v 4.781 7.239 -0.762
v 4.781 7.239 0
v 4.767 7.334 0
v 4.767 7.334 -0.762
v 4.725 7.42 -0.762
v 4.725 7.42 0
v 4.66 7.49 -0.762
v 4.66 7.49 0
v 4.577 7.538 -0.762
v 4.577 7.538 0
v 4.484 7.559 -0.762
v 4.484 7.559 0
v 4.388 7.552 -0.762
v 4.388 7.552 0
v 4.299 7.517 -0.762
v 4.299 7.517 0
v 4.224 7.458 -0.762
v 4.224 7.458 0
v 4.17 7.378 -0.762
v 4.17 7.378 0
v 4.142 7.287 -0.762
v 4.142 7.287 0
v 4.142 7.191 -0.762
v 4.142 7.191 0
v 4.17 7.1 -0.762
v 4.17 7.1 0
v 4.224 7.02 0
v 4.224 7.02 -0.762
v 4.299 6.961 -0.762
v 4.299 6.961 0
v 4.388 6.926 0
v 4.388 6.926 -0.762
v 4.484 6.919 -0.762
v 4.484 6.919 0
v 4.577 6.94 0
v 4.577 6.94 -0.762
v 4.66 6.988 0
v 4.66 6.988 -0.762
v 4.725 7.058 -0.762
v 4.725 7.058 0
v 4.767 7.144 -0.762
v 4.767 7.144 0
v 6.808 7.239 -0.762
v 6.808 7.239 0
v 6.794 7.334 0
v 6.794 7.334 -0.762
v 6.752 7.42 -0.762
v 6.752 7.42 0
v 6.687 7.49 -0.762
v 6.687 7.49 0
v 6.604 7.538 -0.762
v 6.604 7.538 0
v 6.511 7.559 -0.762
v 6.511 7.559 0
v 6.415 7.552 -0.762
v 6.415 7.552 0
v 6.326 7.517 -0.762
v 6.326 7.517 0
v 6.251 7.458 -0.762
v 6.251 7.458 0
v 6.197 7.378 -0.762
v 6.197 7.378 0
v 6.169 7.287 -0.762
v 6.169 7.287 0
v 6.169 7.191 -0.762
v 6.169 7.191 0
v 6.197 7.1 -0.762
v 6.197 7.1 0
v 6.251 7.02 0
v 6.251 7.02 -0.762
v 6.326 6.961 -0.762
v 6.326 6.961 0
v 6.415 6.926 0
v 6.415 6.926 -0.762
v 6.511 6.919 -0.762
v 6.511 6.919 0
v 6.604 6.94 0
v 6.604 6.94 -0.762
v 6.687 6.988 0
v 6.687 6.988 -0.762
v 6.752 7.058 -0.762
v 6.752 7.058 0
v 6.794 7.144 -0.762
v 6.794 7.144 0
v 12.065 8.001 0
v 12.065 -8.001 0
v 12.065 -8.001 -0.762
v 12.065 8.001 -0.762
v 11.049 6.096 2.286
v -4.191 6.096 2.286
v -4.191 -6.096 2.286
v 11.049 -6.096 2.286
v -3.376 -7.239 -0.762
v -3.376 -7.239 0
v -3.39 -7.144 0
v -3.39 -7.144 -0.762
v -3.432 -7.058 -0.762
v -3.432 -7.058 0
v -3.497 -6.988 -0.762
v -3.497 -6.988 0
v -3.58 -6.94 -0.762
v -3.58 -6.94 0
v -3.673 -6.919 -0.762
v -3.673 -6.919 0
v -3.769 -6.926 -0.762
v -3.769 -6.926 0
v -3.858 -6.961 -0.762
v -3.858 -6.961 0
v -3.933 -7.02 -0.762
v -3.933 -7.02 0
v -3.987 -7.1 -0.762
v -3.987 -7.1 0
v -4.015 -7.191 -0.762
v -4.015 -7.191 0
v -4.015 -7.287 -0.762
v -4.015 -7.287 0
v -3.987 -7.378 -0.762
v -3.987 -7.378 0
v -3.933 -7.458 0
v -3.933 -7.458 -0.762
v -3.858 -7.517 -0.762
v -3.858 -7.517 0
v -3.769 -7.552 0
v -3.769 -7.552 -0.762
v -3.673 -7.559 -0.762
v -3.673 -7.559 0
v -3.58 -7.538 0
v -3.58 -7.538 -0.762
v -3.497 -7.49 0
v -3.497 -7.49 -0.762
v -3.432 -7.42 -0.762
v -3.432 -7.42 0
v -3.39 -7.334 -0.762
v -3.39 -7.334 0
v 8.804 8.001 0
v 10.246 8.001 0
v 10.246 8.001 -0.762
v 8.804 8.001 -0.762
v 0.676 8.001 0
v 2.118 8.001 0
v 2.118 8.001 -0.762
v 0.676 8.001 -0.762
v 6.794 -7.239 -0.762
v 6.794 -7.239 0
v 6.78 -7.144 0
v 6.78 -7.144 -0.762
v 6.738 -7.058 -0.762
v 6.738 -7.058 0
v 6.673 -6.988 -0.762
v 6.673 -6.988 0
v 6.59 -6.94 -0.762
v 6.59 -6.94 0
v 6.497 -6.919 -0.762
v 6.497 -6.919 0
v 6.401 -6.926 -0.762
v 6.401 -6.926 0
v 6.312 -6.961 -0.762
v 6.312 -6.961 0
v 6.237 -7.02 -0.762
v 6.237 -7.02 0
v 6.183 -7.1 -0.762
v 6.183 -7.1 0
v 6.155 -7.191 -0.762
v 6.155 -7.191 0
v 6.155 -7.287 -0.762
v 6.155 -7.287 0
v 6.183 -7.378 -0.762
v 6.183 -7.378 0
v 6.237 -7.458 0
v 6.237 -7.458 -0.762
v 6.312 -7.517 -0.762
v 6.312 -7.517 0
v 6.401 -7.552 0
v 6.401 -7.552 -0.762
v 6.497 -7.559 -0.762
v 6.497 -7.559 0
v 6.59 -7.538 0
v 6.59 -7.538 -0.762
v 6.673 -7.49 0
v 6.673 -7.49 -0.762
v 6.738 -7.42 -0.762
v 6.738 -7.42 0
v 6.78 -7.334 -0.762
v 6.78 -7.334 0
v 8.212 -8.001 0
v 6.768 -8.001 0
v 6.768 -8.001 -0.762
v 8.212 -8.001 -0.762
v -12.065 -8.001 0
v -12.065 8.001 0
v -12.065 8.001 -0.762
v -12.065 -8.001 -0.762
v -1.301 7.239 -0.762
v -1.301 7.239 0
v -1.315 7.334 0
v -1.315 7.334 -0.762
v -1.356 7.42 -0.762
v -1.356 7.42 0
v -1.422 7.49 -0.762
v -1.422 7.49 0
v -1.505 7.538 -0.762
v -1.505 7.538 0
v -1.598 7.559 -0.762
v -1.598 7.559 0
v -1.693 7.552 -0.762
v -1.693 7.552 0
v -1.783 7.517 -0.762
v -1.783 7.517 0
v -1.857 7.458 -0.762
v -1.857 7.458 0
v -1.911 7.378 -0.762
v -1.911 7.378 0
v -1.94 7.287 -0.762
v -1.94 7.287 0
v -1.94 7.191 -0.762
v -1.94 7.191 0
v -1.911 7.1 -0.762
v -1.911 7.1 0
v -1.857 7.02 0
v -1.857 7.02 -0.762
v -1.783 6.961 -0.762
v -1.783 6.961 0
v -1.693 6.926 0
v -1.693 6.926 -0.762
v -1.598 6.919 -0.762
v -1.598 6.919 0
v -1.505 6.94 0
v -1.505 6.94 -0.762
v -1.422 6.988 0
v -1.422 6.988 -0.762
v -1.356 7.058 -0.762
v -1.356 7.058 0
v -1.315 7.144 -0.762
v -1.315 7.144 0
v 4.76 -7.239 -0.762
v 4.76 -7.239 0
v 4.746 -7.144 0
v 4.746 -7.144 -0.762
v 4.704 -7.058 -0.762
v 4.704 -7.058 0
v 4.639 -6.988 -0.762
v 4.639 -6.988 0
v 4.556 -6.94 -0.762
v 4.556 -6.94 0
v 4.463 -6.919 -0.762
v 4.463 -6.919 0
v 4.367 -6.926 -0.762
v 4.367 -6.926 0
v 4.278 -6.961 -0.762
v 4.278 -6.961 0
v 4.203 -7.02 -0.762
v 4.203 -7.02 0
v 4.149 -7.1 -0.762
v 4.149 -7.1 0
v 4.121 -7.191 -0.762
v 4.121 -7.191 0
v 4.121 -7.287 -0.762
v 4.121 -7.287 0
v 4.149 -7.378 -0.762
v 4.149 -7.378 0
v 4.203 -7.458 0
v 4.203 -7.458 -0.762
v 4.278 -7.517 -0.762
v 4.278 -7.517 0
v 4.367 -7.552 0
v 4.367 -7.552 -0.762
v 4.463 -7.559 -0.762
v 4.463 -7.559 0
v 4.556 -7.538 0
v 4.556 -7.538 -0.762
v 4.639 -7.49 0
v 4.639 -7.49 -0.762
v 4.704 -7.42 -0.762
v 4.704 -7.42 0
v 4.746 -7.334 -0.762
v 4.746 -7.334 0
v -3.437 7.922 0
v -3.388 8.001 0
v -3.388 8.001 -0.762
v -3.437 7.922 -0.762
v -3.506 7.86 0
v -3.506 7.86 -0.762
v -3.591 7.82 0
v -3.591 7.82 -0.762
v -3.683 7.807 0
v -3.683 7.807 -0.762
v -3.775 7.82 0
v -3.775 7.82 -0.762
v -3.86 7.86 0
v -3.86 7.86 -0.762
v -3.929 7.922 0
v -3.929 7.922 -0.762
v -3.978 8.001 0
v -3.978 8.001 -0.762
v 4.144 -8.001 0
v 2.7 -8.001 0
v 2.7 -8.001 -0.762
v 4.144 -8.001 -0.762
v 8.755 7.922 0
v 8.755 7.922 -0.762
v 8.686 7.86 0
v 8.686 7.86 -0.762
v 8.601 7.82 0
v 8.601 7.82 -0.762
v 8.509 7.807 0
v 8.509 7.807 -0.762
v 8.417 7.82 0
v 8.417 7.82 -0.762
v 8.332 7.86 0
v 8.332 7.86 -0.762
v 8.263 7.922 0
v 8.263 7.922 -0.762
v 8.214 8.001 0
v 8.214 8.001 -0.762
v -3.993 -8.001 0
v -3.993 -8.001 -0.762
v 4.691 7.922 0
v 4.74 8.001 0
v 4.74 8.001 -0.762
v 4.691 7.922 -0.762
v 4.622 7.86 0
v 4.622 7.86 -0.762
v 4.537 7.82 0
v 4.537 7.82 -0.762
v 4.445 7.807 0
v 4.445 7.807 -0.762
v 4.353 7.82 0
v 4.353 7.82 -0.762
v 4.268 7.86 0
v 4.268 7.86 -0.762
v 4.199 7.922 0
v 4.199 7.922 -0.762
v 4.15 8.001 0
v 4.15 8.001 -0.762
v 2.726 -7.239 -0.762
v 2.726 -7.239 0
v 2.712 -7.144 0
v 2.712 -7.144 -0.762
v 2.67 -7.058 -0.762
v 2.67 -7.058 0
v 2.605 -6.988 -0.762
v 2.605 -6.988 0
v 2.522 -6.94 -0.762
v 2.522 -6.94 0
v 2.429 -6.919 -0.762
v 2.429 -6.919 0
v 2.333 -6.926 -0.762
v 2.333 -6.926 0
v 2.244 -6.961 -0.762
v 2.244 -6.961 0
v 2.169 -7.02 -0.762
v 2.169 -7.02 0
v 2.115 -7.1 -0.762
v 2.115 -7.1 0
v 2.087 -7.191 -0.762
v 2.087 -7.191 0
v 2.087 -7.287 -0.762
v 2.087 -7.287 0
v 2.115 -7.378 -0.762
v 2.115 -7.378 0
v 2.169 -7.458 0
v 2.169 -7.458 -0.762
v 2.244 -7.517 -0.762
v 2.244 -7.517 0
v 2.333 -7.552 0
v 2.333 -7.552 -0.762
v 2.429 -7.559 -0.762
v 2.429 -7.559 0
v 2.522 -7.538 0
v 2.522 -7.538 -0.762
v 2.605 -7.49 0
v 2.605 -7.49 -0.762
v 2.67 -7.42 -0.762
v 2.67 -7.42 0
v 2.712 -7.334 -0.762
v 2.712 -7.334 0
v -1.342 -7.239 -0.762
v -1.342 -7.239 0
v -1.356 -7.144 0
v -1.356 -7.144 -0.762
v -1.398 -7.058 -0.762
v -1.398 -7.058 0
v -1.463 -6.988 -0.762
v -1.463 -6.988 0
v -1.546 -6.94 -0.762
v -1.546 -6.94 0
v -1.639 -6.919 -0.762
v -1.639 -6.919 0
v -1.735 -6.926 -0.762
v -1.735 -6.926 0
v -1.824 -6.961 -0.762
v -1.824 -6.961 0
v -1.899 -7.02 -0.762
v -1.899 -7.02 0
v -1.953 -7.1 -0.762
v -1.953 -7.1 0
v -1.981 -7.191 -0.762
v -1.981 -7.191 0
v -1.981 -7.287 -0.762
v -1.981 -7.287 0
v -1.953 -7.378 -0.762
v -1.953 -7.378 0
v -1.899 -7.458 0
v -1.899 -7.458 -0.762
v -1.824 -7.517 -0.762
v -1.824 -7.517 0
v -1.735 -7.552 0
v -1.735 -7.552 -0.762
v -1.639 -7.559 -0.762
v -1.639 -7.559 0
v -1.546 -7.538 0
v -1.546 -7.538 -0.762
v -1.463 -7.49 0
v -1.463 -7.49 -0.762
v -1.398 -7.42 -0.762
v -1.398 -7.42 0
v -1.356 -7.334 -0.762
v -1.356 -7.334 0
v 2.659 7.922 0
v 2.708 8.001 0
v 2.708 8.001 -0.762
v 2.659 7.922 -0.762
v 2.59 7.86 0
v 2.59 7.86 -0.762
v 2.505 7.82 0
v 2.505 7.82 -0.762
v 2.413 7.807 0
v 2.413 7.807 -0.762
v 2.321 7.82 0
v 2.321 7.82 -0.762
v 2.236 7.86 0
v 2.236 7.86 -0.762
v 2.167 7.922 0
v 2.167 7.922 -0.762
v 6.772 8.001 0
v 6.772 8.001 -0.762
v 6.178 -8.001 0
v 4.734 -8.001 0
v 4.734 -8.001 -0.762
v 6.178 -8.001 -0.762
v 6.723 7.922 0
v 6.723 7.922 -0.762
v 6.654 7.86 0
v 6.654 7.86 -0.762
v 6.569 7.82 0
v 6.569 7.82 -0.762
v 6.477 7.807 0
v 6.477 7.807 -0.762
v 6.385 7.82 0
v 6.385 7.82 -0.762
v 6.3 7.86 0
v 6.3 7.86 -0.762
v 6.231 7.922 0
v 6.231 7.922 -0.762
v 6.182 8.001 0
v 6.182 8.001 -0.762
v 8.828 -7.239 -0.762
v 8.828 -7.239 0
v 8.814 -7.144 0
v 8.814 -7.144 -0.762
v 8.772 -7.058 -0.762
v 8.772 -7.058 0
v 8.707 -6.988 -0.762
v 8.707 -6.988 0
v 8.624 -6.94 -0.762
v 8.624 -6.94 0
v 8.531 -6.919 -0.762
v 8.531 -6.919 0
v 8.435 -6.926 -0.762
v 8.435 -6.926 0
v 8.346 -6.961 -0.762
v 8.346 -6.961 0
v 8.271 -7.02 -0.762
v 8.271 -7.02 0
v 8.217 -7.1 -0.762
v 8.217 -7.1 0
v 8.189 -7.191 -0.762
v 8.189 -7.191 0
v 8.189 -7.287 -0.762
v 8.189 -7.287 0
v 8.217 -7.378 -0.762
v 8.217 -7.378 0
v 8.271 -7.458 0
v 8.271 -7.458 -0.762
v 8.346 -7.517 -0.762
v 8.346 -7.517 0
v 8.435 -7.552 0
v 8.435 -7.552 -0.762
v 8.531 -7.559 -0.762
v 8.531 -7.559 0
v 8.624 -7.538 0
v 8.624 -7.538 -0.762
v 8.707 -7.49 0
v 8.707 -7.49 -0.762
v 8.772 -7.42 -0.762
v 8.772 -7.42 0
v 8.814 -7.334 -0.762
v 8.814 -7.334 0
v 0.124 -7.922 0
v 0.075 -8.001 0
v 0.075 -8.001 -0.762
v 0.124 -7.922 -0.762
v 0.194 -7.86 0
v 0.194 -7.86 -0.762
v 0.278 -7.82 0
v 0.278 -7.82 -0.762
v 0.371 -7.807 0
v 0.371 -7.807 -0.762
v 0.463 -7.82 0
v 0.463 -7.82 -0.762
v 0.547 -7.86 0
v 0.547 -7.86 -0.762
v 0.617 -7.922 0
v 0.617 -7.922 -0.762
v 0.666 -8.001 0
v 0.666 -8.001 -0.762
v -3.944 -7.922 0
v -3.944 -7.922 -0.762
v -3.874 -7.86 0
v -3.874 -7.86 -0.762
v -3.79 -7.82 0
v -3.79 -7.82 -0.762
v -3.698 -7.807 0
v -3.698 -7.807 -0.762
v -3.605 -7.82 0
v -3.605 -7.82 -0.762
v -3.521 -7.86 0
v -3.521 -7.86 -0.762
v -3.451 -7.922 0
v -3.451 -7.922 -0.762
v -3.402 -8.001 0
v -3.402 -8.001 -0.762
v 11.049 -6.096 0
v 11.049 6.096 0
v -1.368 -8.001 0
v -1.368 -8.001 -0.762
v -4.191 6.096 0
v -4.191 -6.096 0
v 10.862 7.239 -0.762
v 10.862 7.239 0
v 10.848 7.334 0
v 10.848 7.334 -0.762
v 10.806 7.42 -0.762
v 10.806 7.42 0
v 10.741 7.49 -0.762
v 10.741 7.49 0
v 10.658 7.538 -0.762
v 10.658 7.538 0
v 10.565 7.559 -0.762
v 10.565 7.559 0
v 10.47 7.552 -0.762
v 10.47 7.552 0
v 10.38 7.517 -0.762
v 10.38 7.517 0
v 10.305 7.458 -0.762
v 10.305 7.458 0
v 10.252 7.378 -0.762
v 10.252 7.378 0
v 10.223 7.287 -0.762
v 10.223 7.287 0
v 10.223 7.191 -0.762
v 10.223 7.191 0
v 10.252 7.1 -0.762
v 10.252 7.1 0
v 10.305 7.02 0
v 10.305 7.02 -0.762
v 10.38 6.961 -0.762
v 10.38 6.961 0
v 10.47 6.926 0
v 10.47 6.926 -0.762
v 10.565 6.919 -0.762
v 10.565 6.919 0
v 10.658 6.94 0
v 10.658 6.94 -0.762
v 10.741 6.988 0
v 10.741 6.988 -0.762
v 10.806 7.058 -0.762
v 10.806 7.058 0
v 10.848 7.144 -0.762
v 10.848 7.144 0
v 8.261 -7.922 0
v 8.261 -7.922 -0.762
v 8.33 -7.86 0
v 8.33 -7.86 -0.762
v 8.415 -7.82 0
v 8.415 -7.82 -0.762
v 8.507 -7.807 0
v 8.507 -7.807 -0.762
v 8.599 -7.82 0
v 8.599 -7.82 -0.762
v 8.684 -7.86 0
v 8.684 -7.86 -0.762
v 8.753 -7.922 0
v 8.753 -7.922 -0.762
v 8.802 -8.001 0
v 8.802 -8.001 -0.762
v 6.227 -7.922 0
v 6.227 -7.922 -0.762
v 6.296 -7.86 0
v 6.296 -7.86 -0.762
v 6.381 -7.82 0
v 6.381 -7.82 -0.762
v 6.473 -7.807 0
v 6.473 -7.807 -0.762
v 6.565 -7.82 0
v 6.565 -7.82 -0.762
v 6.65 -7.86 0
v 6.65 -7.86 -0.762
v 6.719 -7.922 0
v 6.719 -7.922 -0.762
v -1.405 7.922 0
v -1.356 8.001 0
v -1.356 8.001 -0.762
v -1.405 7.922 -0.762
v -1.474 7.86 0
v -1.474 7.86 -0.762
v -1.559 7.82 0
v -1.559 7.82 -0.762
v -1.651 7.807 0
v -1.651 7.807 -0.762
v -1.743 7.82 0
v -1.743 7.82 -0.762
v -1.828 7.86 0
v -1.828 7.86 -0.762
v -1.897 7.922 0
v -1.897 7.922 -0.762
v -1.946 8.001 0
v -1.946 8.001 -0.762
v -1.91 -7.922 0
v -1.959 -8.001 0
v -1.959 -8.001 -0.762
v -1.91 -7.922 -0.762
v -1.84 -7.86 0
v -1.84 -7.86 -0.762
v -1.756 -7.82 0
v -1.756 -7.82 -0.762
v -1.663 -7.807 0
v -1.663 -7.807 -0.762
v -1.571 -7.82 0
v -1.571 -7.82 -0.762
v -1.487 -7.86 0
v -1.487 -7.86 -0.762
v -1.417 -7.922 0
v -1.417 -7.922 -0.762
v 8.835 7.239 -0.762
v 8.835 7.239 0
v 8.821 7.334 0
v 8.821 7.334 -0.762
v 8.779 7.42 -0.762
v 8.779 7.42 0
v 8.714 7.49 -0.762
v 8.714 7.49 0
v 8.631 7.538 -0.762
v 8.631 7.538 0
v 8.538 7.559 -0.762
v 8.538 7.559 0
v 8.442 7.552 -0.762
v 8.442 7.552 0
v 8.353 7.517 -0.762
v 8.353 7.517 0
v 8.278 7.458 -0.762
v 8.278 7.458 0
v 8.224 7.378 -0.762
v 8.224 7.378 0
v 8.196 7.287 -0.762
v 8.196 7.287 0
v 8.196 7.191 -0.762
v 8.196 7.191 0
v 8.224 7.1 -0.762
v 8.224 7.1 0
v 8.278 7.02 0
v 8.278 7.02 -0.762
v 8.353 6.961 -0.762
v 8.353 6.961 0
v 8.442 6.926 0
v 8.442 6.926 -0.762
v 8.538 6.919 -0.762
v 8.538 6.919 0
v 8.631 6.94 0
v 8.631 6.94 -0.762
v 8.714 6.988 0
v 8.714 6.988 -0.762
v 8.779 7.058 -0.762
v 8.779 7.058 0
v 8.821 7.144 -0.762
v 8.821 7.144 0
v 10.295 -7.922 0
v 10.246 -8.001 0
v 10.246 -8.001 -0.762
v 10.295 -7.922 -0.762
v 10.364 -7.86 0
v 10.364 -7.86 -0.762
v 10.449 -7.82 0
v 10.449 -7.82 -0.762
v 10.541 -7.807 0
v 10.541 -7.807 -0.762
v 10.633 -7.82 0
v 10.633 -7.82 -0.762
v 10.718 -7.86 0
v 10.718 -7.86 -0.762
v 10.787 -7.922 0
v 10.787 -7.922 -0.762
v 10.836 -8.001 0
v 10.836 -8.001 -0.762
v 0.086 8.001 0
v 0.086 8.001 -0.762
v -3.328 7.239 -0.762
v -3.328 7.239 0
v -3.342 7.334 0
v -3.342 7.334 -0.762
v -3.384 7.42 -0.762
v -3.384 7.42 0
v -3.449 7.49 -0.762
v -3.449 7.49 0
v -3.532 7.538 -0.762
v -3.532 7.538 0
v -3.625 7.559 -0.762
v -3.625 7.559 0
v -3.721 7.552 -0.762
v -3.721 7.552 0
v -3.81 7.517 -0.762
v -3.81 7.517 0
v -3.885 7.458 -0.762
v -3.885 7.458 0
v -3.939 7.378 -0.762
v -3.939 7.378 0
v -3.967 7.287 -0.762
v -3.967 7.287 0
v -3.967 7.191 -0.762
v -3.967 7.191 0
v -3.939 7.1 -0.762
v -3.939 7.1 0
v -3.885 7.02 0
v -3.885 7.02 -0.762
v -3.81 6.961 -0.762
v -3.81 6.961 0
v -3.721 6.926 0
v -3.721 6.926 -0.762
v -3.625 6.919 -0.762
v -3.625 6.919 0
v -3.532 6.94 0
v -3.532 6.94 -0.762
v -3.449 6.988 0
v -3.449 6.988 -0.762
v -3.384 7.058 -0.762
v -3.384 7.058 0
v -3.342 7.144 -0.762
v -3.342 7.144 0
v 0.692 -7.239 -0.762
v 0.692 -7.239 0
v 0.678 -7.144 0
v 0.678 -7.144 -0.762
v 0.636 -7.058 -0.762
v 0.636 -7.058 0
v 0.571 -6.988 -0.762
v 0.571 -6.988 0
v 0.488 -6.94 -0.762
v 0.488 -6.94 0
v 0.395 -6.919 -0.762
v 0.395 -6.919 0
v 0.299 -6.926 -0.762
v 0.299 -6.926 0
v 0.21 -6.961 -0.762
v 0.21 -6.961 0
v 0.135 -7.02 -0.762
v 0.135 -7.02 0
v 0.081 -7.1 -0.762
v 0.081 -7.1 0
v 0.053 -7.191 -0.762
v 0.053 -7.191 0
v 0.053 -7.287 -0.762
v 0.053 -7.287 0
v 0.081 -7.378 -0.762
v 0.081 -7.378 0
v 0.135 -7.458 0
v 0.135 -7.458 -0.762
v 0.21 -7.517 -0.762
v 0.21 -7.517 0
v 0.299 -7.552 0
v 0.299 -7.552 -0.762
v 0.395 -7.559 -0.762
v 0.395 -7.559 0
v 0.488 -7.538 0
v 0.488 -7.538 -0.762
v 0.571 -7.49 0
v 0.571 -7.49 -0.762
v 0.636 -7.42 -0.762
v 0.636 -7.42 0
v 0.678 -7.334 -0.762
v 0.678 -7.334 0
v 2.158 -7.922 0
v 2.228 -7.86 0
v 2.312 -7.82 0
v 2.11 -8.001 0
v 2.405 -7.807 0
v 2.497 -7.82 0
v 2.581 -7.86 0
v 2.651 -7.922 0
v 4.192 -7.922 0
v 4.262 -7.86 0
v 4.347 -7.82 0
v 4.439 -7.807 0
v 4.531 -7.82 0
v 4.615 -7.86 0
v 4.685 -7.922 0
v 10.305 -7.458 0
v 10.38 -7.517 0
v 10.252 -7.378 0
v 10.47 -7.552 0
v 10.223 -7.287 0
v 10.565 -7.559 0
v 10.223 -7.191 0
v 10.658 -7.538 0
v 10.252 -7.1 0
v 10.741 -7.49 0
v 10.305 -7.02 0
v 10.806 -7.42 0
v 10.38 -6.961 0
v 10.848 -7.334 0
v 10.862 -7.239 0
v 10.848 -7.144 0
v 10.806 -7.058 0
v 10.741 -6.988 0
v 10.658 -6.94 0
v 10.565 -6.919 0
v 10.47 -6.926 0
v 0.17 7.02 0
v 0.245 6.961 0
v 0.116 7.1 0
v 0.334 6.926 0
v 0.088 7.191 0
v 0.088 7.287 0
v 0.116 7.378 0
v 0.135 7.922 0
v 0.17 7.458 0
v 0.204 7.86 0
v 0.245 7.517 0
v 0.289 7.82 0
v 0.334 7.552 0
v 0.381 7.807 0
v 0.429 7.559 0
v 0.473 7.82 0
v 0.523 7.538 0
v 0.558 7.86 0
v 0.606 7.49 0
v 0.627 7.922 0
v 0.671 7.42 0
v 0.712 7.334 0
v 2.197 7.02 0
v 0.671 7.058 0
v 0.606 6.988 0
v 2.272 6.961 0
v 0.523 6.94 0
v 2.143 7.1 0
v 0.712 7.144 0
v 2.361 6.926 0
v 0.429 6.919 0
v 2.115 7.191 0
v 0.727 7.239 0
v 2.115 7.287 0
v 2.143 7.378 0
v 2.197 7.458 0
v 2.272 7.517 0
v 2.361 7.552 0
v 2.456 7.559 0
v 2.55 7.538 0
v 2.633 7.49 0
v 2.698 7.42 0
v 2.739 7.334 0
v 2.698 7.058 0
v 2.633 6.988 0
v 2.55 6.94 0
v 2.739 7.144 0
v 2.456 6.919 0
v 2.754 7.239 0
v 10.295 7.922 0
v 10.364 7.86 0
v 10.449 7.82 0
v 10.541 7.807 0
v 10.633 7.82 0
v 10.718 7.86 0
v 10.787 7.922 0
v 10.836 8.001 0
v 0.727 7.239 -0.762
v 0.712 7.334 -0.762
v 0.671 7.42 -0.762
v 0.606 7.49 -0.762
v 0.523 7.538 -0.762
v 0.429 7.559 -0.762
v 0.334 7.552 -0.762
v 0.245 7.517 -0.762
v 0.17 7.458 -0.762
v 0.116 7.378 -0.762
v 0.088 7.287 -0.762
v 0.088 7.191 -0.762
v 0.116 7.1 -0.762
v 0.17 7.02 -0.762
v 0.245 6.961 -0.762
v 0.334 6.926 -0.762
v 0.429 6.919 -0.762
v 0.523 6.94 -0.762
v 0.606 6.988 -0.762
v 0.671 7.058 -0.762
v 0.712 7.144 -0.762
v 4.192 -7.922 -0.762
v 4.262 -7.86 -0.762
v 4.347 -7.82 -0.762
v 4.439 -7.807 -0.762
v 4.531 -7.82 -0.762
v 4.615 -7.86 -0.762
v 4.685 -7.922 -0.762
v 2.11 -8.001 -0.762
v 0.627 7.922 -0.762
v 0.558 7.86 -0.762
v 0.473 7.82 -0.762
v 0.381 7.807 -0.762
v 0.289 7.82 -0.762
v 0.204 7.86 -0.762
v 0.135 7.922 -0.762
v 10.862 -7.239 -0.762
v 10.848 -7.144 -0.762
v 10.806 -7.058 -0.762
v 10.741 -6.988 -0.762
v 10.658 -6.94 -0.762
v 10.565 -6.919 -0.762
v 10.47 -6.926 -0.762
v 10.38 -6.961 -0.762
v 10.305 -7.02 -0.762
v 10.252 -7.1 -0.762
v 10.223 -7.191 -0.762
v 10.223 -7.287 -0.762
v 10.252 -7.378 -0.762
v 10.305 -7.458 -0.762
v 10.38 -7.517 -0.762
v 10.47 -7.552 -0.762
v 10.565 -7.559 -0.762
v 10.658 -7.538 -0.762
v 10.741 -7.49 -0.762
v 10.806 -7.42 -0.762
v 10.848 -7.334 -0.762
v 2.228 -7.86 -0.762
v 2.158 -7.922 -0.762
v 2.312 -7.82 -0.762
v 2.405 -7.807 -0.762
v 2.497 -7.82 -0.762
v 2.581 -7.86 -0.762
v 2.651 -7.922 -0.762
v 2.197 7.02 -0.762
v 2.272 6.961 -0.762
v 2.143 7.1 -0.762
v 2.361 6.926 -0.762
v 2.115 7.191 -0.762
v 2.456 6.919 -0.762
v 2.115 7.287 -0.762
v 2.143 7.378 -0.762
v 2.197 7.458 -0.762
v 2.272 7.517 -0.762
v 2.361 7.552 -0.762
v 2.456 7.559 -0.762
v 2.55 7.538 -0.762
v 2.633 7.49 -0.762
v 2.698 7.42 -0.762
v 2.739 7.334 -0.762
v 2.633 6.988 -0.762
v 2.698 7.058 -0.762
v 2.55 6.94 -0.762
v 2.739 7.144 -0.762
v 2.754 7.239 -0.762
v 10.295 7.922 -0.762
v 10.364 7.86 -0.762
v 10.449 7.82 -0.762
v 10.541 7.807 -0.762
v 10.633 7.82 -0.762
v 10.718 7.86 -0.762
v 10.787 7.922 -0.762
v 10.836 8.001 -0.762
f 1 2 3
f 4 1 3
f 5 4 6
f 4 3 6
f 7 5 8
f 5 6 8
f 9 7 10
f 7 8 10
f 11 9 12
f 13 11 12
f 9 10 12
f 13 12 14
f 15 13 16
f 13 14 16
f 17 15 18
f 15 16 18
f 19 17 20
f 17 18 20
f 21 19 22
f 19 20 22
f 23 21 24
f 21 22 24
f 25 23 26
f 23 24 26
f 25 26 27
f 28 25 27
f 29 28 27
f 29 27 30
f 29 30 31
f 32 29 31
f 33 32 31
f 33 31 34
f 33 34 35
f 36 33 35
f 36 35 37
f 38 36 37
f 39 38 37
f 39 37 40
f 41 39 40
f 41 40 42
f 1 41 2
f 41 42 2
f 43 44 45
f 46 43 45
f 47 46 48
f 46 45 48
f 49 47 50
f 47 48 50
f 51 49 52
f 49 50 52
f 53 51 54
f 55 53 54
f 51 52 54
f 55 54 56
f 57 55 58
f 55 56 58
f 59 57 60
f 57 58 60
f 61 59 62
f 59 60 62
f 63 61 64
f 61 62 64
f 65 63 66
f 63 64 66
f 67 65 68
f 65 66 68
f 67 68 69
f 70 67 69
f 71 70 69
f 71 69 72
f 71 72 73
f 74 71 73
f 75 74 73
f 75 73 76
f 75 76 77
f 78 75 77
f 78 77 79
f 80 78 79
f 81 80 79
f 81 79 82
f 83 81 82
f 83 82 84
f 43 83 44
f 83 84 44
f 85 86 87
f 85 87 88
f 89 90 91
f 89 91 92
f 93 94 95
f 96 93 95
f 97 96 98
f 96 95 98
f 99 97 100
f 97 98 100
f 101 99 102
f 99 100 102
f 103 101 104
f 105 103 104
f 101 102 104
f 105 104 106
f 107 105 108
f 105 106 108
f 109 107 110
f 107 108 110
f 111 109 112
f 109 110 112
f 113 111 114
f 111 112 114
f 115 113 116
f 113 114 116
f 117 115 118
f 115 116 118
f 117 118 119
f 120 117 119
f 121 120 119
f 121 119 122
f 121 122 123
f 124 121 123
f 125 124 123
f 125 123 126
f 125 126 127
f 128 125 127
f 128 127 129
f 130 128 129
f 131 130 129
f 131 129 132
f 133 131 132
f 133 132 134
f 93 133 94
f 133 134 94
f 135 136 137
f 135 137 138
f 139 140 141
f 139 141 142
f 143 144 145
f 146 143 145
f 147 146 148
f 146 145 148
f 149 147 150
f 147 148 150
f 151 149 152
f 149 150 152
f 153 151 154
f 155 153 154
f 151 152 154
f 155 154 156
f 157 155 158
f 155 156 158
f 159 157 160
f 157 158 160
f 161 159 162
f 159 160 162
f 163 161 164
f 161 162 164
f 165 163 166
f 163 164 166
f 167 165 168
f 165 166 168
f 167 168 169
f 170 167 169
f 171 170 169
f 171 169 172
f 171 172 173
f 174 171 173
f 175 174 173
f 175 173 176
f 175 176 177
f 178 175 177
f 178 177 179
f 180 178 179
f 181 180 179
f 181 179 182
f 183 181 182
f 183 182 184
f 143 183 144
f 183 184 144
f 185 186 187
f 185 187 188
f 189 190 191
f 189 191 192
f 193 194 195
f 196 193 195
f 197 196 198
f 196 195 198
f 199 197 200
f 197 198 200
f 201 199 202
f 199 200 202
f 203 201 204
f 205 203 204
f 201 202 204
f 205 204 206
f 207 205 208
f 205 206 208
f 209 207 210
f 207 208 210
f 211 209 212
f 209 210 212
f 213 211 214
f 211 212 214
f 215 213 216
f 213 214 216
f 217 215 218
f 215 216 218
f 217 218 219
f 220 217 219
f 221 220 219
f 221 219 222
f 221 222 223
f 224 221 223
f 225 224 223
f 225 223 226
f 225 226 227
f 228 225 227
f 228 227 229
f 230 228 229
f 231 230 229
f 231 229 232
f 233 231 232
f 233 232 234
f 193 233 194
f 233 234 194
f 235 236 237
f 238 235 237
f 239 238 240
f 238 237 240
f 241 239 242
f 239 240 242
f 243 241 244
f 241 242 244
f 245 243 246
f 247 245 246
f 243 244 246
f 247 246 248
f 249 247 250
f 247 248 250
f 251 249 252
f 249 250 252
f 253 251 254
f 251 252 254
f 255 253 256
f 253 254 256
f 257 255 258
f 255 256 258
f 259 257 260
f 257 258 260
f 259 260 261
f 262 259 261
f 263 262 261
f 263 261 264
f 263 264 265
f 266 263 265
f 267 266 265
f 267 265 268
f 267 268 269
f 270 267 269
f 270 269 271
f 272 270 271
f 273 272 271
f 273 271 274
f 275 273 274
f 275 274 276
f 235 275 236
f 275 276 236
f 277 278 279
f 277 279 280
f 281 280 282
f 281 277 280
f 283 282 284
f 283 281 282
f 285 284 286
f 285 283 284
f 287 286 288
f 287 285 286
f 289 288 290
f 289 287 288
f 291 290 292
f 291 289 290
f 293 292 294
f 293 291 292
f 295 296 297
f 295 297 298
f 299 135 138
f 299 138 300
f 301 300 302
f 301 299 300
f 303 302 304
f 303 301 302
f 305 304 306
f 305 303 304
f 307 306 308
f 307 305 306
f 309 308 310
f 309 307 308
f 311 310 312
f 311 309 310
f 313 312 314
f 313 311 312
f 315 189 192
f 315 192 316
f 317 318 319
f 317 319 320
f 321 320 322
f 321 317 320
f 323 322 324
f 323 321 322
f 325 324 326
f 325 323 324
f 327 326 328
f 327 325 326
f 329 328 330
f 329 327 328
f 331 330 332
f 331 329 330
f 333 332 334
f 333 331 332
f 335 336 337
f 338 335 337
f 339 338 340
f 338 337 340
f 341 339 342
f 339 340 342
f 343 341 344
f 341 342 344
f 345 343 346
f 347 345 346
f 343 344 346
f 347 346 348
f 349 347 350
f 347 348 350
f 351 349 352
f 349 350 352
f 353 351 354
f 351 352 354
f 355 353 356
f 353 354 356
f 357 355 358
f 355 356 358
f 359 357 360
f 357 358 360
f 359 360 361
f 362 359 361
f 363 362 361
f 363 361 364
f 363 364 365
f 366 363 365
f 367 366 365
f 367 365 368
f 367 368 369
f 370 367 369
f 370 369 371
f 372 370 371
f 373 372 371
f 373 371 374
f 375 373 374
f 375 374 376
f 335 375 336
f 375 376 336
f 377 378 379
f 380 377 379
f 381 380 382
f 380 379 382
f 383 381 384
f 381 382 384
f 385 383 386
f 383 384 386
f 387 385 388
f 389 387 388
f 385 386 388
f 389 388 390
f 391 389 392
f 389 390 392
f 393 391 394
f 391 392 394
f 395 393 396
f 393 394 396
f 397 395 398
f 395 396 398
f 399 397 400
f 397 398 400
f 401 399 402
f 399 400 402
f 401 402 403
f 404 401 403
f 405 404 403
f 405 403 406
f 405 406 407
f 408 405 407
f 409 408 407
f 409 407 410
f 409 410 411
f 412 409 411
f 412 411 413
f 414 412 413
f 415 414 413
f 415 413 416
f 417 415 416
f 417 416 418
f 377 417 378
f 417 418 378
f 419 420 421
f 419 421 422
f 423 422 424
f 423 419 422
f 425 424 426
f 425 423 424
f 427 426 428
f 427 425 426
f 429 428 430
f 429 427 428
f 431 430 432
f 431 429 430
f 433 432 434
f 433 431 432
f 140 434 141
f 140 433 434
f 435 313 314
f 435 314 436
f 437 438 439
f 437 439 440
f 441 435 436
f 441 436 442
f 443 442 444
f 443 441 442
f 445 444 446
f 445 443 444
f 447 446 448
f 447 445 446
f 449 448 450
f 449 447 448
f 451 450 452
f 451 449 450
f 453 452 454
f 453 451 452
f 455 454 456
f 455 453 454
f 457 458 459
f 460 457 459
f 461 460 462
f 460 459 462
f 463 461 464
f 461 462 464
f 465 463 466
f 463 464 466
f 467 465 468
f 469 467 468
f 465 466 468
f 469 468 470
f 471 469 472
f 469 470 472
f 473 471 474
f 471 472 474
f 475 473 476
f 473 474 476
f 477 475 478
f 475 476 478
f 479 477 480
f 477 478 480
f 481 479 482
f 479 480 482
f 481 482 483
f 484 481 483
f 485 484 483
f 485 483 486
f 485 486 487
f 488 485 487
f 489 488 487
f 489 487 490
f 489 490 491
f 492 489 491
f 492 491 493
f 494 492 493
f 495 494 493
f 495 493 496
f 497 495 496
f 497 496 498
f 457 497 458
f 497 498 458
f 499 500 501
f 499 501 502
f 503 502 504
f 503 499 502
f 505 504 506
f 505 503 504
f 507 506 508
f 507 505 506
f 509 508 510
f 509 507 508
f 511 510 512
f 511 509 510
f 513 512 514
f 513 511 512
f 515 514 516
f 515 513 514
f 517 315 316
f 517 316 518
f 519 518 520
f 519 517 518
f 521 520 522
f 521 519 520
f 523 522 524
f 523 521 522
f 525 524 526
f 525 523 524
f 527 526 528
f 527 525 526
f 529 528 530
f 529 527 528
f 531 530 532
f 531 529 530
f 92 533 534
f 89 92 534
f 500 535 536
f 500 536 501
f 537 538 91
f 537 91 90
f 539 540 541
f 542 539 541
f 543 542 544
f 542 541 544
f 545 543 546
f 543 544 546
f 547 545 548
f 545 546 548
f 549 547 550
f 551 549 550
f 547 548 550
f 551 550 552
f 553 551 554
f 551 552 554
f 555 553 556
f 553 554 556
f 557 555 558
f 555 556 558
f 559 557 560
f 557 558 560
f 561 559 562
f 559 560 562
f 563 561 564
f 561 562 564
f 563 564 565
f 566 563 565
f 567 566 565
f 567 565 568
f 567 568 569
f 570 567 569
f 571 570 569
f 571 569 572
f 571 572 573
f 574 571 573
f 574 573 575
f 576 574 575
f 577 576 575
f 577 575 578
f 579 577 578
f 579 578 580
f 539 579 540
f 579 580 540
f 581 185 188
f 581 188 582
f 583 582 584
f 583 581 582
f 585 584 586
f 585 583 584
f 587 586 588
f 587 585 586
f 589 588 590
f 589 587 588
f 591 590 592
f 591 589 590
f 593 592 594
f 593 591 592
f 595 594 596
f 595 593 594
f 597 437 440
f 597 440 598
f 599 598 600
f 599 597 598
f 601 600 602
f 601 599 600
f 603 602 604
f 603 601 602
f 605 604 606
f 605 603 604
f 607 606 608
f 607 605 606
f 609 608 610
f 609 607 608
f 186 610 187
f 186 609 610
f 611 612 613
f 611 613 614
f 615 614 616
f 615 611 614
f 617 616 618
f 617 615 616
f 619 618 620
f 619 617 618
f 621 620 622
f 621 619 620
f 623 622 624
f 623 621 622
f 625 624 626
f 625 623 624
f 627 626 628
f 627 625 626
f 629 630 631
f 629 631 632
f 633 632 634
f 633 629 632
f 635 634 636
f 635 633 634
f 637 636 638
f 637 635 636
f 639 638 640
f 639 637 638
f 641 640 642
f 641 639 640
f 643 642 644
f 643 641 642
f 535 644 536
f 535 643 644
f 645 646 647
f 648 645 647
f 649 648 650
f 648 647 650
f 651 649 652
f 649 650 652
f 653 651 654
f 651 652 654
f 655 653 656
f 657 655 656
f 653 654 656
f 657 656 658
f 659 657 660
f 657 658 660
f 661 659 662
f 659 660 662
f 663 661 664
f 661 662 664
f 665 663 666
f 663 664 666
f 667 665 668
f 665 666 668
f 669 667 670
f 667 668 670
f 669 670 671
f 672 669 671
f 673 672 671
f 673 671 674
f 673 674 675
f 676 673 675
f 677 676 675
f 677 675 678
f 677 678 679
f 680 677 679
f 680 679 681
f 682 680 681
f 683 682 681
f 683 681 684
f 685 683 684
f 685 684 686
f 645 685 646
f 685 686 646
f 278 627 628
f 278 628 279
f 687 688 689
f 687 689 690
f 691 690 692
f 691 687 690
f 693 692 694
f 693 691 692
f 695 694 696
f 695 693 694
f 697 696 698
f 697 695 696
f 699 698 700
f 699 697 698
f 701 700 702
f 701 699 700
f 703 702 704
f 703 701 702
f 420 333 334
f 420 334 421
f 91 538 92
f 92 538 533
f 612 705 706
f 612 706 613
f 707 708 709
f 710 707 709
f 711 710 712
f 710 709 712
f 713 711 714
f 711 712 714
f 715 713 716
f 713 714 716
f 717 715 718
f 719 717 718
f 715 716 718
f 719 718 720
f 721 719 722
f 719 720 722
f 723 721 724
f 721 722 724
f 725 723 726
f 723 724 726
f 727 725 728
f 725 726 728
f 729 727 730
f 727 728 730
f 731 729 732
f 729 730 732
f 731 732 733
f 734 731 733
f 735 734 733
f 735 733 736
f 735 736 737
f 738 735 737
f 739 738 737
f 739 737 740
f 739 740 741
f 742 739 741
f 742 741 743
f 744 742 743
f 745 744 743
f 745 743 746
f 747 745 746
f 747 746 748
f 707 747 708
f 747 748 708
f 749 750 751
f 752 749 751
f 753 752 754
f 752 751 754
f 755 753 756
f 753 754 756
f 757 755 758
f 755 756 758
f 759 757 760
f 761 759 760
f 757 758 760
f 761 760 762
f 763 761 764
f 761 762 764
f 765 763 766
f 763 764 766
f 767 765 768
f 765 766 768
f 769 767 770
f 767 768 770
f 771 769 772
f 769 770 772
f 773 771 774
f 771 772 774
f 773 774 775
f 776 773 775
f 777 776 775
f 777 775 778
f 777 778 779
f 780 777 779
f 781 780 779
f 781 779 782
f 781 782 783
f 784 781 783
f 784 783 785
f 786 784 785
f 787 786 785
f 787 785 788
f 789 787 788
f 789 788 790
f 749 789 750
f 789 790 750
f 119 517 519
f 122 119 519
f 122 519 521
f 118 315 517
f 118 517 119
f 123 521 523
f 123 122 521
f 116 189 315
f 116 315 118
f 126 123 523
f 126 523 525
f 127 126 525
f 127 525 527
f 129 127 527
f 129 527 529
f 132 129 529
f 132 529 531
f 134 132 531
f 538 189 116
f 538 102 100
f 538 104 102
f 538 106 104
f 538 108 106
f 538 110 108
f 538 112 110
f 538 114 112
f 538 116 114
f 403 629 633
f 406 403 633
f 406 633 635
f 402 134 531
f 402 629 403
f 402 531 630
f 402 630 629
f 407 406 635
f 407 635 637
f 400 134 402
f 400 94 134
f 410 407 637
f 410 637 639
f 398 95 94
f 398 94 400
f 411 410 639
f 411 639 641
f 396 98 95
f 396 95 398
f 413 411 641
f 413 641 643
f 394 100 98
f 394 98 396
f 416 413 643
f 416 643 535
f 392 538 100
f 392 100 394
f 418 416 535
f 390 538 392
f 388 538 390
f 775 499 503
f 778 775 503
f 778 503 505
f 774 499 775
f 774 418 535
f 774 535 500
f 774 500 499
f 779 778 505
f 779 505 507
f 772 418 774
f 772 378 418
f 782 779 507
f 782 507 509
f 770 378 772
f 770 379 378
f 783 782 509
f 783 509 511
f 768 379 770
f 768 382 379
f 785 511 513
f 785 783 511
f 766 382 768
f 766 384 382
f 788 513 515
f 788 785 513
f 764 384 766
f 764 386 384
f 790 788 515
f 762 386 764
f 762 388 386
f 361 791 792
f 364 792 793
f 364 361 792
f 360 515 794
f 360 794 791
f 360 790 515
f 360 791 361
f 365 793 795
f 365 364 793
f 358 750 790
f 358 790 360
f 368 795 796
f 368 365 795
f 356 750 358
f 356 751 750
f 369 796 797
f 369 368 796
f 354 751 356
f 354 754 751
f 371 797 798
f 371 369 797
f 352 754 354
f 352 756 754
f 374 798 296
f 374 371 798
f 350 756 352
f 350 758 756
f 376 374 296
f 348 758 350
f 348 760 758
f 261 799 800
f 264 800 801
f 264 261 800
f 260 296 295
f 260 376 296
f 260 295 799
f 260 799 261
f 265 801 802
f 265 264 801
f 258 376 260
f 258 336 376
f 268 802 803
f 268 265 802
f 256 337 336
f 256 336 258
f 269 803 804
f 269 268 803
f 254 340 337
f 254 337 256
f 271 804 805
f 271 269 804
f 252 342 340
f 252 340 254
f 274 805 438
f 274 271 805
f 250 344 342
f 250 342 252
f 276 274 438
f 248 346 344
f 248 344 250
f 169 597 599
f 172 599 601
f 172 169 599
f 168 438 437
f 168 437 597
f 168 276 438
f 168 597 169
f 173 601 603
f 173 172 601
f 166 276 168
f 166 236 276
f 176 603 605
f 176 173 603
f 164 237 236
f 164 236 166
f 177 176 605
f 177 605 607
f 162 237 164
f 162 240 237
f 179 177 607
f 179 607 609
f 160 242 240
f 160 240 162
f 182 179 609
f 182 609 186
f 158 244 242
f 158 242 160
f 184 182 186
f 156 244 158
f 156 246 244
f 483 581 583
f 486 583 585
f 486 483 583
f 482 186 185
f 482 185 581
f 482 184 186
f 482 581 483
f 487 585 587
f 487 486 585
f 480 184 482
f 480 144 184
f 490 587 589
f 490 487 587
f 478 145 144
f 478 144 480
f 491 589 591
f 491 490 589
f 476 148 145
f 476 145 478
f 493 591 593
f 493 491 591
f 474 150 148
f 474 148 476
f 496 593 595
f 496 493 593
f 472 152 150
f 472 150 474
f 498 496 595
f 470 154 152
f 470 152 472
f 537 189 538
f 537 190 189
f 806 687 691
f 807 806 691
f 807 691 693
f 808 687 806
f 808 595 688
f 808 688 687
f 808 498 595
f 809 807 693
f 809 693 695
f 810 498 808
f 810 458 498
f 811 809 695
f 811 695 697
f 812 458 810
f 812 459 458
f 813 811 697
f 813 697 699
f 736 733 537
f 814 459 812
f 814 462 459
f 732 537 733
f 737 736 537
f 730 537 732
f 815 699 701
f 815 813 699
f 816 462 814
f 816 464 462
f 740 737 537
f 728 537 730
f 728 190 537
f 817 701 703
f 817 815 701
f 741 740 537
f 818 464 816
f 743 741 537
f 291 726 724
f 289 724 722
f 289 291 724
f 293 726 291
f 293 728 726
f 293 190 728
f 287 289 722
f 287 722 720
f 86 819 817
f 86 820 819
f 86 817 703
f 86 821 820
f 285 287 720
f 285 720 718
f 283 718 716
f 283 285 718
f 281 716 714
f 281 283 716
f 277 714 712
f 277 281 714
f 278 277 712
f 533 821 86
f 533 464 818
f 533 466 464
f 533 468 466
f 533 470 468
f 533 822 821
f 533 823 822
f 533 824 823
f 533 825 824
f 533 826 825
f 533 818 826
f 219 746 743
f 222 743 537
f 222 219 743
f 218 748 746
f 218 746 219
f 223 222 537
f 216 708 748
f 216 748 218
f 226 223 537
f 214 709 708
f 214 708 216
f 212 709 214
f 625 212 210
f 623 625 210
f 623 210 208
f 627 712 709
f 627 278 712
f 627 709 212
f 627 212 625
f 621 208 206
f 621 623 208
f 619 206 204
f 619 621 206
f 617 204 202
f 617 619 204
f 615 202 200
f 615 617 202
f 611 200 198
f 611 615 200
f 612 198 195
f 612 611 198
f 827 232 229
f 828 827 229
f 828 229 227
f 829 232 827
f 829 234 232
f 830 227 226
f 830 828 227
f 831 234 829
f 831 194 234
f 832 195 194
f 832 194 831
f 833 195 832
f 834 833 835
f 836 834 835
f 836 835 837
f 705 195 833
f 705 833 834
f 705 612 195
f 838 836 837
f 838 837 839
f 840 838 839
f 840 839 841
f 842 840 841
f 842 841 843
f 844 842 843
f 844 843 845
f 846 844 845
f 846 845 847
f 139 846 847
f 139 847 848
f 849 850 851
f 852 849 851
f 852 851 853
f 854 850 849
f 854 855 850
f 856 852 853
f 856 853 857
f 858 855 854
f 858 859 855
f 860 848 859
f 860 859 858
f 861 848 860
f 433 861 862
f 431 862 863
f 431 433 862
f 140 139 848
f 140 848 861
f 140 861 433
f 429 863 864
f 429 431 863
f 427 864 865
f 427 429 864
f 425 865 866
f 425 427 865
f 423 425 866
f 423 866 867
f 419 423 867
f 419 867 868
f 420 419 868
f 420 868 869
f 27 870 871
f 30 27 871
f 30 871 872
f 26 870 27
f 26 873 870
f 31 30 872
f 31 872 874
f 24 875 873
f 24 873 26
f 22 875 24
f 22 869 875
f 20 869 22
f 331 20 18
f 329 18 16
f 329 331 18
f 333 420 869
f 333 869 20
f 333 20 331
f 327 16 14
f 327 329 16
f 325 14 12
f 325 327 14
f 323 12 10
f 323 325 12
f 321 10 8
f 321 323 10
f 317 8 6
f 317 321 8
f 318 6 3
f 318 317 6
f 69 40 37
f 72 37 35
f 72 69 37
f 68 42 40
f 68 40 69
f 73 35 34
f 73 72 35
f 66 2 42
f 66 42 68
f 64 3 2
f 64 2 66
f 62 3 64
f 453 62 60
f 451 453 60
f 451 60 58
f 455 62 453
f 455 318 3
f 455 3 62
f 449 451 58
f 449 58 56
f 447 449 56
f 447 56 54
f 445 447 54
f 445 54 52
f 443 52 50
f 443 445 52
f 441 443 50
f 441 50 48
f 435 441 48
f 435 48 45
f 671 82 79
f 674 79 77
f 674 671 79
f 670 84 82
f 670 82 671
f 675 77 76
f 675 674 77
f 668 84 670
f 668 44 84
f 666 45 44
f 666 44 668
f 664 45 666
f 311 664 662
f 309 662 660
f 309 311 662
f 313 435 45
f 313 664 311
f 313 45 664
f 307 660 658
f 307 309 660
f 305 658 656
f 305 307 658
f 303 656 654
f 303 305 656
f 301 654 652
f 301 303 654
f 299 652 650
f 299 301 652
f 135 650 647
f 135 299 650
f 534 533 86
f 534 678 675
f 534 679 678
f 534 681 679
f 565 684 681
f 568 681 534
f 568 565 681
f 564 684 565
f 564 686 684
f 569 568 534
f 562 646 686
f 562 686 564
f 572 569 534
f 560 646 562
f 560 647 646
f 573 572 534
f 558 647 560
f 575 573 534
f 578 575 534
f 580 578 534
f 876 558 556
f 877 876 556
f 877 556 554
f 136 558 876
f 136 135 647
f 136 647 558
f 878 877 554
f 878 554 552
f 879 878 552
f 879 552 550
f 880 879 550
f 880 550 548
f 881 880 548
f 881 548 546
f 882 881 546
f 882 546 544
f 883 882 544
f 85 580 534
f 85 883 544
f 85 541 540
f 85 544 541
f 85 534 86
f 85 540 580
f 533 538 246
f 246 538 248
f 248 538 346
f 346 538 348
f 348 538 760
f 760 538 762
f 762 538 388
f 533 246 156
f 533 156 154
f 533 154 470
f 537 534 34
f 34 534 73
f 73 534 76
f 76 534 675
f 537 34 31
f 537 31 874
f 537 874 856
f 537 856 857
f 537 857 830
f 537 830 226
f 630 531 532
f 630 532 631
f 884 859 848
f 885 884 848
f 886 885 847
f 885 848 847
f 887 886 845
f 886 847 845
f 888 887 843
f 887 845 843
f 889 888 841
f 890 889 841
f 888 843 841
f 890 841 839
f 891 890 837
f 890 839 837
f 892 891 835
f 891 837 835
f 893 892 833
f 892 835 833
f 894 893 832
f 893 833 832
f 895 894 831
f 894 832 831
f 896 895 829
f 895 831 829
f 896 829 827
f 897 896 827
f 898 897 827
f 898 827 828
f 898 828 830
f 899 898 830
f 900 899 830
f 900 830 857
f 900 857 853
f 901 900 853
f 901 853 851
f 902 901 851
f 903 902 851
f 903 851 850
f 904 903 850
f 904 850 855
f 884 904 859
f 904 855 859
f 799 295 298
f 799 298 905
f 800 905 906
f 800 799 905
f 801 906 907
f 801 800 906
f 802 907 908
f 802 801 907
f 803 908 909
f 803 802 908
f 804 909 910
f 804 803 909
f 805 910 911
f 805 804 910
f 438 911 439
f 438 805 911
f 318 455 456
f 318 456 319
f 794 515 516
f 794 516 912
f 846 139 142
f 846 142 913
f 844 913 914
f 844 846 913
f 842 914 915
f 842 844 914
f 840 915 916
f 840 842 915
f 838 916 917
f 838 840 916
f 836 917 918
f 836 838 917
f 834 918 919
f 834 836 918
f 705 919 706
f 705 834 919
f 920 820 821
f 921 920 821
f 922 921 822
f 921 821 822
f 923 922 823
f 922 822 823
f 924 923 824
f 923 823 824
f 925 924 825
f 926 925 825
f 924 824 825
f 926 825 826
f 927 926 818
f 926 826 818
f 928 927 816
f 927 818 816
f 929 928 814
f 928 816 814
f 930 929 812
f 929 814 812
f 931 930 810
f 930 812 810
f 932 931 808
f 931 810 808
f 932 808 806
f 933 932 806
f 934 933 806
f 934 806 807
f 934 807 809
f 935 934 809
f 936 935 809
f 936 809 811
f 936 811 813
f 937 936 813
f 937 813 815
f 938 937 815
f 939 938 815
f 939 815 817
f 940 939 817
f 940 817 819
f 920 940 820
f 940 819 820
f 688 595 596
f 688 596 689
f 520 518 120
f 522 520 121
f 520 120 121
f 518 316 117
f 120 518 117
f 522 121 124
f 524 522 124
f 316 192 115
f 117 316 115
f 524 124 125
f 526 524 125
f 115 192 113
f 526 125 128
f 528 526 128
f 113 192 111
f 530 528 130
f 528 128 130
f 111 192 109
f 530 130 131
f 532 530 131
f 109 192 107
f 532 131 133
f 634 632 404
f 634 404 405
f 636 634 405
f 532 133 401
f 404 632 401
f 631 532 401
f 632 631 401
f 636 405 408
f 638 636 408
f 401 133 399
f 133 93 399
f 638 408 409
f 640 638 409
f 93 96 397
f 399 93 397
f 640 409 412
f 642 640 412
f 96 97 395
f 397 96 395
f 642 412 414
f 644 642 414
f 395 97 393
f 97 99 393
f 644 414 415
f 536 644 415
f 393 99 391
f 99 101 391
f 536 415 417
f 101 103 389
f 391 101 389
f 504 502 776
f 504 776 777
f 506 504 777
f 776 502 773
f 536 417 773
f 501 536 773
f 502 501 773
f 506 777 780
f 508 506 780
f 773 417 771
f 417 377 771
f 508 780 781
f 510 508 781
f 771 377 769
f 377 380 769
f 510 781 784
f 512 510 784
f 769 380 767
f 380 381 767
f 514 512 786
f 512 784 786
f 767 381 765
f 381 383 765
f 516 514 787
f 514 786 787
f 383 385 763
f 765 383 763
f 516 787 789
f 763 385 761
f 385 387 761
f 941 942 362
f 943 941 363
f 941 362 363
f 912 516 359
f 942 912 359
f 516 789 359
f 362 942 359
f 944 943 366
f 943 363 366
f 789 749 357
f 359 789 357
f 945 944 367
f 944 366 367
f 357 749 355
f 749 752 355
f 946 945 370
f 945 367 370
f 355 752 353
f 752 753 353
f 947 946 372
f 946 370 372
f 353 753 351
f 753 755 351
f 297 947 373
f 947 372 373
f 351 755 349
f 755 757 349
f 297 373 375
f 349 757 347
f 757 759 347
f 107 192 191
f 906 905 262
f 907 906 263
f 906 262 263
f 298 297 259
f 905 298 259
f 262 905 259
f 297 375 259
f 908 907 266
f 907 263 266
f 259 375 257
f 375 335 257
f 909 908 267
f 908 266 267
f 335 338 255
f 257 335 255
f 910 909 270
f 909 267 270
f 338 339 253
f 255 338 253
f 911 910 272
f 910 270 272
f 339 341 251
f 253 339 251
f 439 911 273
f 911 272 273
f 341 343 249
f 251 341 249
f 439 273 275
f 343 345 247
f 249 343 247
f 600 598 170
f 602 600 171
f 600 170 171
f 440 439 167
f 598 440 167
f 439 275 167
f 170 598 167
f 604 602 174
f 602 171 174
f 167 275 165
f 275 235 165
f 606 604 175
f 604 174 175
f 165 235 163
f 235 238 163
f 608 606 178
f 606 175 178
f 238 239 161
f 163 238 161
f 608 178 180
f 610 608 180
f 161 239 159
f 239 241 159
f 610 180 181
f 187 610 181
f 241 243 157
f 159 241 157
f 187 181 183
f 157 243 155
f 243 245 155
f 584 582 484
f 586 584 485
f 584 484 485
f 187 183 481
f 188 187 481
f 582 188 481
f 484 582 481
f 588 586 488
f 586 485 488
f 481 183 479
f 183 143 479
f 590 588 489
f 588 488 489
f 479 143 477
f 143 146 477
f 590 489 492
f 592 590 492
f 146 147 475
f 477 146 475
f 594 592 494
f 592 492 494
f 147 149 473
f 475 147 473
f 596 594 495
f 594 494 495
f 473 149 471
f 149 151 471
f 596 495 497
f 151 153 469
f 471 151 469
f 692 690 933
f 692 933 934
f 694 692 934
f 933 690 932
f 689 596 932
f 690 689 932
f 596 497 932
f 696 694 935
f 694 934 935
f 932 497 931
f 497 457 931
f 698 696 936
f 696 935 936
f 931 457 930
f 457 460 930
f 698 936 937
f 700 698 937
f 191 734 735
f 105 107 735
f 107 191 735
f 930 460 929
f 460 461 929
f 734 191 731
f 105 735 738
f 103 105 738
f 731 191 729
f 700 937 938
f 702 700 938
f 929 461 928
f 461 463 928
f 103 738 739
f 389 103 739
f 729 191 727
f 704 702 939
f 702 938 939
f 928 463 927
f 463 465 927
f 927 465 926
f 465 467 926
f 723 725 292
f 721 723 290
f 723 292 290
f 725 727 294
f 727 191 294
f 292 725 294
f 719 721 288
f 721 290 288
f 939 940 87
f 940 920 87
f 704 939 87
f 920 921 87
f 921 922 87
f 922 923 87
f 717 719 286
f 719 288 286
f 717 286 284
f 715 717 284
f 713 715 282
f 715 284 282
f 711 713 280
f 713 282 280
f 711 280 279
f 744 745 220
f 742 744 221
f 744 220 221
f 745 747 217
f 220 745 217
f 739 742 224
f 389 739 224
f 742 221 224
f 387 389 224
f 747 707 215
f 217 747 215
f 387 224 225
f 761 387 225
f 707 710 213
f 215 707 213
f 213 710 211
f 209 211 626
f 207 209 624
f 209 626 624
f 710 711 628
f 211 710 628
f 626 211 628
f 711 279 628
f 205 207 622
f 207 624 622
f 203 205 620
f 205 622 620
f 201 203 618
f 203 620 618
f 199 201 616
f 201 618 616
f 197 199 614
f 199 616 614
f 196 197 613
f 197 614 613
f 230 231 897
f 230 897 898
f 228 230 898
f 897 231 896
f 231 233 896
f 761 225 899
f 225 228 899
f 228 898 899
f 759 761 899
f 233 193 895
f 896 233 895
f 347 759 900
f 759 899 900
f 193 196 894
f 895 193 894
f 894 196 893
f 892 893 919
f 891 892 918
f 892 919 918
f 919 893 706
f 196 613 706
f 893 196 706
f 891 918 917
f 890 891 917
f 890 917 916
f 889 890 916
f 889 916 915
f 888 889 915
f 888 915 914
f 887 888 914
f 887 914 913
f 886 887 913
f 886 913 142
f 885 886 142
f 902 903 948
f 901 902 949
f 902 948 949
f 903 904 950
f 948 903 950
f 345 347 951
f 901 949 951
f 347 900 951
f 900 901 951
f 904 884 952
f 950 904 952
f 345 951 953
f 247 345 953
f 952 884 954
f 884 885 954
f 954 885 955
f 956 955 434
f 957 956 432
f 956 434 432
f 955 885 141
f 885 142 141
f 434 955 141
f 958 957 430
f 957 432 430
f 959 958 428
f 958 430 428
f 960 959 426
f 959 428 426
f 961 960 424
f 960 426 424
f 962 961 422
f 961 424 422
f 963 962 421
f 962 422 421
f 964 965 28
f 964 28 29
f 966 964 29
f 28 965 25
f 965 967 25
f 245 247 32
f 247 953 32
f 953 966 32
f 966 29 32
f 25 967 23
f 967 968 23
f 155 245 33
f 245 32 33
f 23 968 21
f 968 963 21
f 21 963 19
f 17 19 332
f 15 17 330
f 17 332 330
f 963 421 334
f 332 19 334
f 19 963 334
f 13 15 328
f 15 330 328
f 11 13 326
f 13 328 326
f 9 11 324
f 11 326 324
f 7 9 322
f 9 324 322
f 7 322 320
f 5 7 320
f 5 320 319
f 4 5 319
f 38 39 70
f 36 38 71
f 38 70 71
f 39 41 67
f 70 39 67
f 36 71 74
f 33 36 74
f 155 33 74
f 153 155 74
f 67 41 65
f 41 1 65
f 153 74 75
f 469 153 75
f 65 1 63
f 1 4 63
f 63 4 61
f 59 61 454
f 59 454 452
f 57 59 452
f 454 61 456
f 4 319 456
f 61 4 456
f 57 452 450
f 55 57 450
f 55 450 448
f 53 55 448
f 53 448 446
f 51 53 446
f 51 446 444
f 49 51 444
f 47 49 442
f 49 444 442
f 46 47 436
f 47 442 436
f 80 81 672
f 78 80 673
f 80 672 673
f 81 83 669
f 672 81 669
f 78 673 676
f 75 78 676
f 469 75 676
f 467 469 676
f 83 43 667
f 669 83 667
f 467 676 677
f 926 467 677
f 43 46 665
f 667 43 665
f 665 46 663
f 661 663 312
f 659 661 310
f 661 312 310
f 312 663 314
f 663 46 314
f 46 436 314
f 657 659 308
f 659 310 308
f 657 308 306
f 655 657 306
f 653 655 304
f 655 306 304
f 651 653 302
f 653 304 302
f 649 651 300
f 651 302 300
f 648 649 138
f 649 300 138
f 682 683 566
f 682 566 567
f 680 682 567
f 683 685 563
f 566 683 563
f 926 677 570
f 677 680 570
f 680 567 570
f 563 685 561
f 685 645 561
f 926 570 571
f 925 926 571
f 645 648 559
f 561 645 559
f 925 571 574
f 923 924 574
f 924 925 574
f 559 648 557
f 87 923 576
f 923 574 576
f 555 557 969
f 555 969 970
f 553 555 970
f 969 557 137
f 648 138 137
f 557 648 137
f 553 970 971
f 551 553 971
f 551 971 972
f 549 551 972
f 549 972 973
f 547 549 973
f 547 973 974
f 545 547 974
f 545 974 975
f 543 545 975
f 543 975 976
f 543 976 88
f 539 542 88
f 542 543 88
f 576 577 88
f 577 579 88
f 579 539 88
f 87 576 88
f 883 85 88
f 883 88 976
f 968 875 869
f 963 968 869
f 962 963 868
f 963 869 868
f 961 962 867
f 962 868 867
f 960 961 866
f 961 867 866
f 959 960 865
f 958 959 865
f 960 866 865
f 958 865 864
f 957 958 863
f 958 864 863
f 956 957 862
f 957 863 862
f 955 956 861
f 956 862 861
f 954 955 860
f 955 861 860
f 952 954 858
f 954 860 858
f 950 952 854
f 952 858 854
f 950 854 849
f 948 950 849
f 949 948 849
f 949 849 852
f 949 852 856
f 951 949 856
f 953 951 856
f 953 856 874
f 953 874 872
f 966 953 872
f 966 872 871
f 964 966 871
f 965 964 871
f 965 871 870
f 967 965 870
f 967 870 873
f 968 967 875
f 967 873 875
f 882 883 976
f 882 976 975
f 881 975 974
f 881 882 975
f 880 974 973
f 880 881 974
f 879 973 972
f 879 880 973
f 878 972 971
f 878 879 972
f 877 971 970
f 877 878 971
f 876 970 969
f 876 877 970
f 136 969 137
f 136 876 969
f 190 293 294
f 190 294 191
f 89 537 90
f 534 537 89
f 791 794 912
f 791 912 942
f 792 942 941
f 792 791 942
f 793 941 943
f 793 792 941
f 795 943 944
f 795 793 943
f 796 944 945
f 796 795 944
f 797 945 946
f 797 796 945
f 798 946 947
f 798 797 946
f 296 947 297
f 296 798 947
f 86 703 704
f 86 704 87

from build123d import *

# Parameters (mm, degrees)
F0_R     = 0.32131
F0_W     = 15.24
F0_H     = 12.192
F1_DEPTH = 0.762
F2_DEPTH = 2.286


with BuildPart() as f1:
    # F0 (on Top) → F1 (new body)
    with BuildSketch(Plane.XY):
        with BuildLine():
            Line((12.065, -8.001), (12.065, 8.001))
            Line((12.065, 8.001), (10.836146, 8.001))
            ThreePointArc((10.836146, 8.001), (10.541, 7.80669), (10.245854, 8.001))
            Line((10.245854, 8.001), (8.804146, 8.001))
            ThreePointArc((8.804146, 8.001), (8.509, 7.80669), (8.213854, 8.001))
            Line((8.213854, 8.001), (6.772146, 8.001))
            ThreePointArc((6.772146, 8.001), (6.477, 7.80669), (6.181854, 8.001))
            Line((6.181854, 8.001), (4.740146, 8.001))
            ThreePointArc((4.740146, 8.001), (4.445, 7.80669), (4.149854, 8.001))
            Line((4.149854, 8.001), (2.708146, 8.001))
            ThreePointArc((2.708146, 8.001), (2.413, 7.80669), (2.117854, 8.001))
            Line((2.117854, 8.001), (0.676146, 8.001))
            ThreePointArc((0.676146, 8.001), (0.381, 7.80669), (0.085854, 8.001))
            Line((0.085854, 8.001), (-1.355854, 8.001))
            ThreePointArc((-1.355854, 8.001), (-1.651, 7.80669), (-1.946146, 8.001))
            Line((-1.946146, 8.001), (-3.387854, 8.001))
            ThreePointArc((-3.387854, 8.001), (-3.683, 7.80669), (-3.978146, 8.001))
            Line((-3.978146, 8.001), (-12.065, 8.001))
            Line((-12.065, 8.001), (-12.065, -8.001))
            Line((-12.065, -8.001), (-3.992706, -8.001))
            ThreePointArc((-3.992706, -8.001), (-3.69756, -7.80669), (-3.402414, -8.001))
            Line((-3.402414, -8.001), (-1.958626, -8.001))
            ThreePointArc((-1.958626, -8.001), (-1.66348, -7.80669), (-1.368334, -8.001))
            Line((-1.368334, -8.001), (0.075454, -8.001))
            ThreePointArc((0.075454, -8.001), (0.3706, -7.80669), (0.665746, -8.001))
            Line((0.665746, -8.001), (2.109534, -8.001))
            ThreePointArc((2.109534, -8.001), (2.40468, -7.80669), (2.699826, -8.001))
            Line((2.699826, -8.001), (4.143614, -8.001))
            ThreePointArc((4.143614, -8.001), (4.43876, -7.80669), (4.733906, -8.001))
            Line((4.733906, -8.001), (6.177694, -8.001))
            ThreePointArc((6.177694, -8.001), (6.47284, -7.80669), (6.767986, -8.001))
            Line((6.767986, -8.001), (8.211774, -8.001))
            ThreePointArc((8.211774, -8.001), (8.50692, -7.80669), (8.802066, -8.001))
            Line((8.802066, -8.001), (10.245854, -8.001))
            ThreePointArc((10.245854, -8.001), (10.541, -7.80669), (10.836146, -8.001))
            Line((10.836146, -8.001), (12.065, -8.001))
        make_face()
        with Locations((-3.69721, -7.239)):
            Circle(F0_R, mode=Mode.SUBTRACT)
        with Locations((-1.66318, -7.239)):
            Circle(F0_R, mode=Mode.SUBTRACT)
        with Locations((0.37085, -7.239)):
            Circle(F0_R, mode=Mode.SUBTRACT)
        with Locations((2.40488, -7.239)):
            Circle(F0_R, mode=Mode.SUBTRACT)
        with Locations((4.43891, -7.239)):
            Circle(F0_R, mode=Mode.SUBTRACT)
        with Locations((6.47294, -7.239)):
            Circle(F0_R, mode=Mode.SUBTRACT)
        with Locations((8.50697, -7.239)):
            Circle(F0_R, mode=Mode.SUBTRACT)
        with Locations((10.541, -7.239)):
            Circle(F0_R, mode=Mode.SUBTRACT)
        with Locations((-3.64905, 7.239)):
            Circle(F0_R, mode=Mode.SUBTRACT)
        with Locations((-1.6219, 7.239)):
            Circle(F0_R, mode=Mode.SUBTRACT)
        with Locations((3.429, 0)):
            Rectangle(F0_W, F0_H, mode=Mode.SUBTRACT)
        with Locations((0.40525, 7.239)):
            Circle(F0_R, mode=Mode.SUBTRACT)
        with Locations((2.4324, 7.239)):
            Circle(F0_R, mode=Mode.SUBTRACT)
        with Locations((4.45955, 7.239)):
            Circle(F0_R, mode=Mode.SUBTRACT)
        with Locations((6.4867, 7.239)):
            Circle(F0_R, mode=Mode.SUBTRACT)
        with Locations((8.51385, 7.239)):
            Circle(F0_R, mode=Mode.SUBTRACT)
        with Locations((10.541, 7.239)):
            Circle(F0_R, mode=Mode.SUBTRACT)
        with Locations((3.429, 0)):
            Rectangle(F0_W, F0_H)
    extrude(amount=-F1_DEPTH)

    # F0 (on Top) → F2 (join)
    with BuildSketch(Plane.XY):
        with Locations((3.429, 0)):
            Rectangle(F0_W, F0_H)
    extrude(amount=F2_DEPTH)


solid = f1.part
